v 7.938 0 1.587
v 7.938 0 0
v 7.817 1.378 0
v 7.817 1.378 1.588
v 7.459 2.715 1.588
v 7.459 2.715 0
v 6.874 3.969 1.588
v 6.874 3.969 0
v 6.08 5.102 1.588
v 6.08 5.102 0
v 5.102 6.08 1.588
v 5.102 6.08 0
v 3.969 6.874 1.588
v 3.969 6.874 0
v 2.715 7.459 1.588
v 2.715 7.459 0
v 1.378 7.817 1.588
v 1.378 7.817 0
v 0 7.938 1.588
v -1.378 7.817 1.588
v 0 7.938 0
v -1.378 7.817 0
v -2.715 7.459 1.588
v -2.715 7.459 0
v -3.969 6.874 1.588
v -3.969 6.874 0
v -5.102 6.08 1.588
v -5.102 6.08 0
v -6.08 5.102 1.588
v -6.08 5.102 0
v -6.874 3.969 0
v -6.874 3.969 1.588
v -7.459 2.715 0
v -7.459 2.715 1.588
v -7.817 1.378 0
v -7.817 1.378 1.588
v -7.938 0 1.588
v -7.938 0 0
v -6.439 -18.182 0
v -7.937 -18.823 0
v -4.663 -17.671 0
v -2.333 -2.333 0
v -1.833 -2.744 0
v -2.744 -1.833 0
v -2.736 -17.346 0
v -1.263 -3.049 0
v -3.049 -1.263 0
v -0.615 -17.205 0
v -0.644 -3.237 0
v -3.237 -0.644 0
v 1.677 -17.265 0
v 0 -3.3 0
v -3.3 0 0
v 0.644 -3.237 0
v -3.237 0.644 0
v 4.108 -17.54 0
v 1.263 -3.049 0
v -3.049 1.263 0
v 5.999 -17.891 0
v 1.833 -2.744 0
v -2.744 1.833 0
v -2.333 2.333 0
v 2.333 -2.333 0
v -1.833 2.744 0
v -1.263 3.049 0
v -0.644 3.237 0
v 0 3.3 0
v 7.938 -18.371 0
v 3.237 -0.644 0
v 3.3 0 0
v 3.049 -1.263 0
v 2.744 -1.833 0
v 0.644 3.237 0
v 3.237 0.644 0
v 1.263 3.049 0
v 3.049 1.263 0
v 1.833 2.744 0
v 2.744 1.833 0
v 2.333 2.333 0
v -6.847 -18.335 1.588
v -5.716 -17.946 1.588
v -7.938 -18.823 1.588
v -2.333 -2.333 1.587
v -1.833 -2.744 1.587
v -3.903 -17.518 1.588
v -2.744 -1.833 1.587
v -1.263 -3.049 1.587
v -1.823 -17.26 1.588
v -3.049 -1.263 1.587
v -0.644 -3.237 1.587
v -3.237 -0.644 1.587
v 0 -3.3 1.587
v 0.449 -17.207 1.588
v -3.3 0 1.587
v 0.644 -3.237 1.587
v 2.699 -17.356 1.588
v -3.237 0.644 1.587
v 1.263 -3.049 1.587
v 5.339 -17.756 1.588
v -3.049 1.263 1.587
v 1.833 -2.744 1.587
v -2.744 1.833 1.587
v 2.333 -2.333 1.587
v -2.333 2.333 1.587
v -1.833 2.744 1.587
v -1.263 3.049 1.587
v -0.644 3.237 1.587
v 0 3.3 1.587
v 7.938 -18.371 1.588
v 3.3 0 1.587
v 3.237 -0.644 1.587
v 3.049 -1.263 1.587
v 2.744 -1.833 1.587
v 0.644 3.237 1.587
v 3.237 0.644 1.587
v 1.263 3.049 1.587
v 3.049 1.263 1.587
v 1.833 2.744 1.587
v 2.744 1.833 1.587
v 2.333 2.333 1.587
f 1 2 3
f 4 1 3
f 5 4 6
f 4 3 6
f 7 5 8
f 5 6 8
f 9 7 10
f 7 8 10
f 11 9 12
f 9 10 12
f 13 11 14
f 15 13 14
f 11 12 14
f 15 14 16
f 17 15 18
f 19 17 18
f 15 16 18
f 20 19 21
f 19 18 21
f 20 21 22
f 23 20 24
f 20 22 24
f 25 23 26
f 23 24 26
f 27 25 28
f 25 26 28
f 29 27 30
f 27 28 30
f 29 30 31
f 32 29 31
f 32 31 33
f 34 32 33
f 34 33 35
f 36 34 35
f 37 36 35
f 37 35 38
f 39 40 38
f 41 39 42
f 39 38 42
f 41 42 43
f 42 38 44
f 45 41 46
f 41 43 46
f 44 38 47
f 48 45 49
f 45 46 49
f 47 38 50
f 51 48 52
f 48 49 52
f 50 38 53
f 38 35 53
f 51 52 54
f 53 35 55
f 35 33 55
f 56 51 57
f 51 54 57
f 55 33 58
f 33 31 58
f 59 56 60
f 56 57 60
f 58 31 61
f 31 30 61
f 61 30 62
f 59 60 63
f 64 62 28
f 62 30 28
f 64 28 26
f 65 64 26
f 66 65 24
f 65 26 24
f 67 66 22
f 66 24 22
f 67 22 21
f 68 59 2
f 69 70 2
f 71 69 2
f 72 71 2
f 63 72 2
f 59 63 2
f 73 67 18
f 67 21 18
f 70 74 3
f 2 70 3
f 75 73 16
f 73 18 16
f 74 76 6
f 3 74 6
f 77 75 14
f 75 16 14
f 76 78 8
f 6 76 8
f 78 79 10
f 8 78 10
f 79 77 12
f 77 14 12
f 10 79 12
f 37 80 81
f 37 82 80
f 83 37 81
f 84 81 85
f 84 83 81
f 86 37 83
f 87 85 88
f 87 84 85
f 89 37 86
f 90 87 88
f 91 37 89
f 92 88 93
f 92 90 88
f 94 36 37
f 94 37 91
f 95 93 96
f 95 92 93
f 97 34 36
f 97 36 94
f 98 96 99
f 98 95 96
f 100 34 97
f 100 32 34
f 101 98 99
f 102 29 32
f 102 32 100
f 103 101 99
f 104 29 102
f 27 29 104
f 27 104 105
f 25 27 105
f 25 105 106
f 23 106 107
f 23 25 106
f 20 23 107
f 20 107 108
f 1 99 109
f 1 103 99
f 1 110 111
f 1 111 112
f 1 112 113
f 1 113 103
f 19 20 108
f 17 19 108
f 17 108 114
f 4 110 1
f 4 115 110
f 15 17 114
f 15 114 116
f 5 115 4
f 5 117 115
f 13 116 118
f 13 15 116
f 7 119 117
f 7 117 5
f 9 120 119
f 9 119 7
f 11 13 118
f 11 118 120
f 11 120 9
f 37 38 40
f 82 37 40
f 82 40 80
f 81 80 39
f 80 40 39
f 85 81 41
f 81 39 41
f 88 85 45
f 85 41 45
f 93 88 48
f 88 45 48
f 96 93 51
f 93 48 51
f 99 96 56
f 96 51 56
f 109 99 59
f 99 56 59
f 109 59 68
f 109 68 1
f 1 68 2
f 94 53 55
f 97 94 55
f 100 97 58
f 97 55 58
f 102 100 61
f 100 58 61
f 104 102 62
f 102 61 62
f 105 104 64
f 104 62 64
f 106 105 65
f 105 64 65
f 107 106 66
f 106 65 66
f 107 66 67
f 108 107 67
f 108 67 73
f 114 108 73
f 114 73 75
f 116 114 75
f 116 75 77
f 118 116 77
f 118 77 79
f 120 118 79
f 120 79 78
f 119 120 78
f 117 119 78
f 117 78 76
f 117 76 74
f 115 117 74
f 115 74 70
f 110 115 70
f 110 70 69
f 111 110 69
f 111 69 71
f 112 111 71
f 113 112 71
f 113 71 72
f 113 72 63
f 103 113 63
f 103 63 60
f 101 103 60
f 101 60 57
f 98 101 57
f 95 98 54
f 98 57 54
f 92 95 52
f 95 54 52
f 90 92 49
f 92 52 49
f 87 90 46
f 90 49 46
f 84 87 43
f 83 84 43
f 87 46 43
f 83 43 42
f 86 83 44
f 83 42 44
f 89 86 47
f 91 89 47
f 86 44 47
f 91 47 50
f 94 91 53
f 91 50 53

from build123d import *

# Parameters (mm, degrees)
SKETCH1_R            = 7.9375
SKETCH1_R_2          = 3
BOSS_EXTRUDE1_DEPTH  = 1.5875
M6_CLEARANCE_HOLE1_D = 6.6
SKETCH5_W            = 15.875
SKETCH5_H            = 6.35
CUT_EXTRUDE2_DEPTH   = 27.658658303
CUT_EXTRUDE3_DEPTH   = 21.698467637


with BuildPart() as part:
    # Sketch1 → Boss-Extrude1 (new body)
    # profile 1 of 3: a face of its own
    with BuildSketch(Plane.XY):
        Circle(SKETCH1_R)
        Circle(SKETCH1_R_2, mode=Mode.SUBTRACT)
    # profile 2 of 3: a face of its own
    with BuildSketch(Plane.XY):
        with BuildLine():
            ThreePointArc((7.9375, 0), (0, -7.9375), (-7.9375, 0))
            Line((-7.9375, 0), (-7.9375, -25.4))
            Line((-7.9375, -25.4), (7.9375, -25.4))
            Line((7.9375, -25.4), (7.9375, 0))
        make_face()
    # profile 3 of 3: a face of its own
    with BuildSketch(Plane.XY):
        Circle(SKETCH1_R_2)
    extrude(amount=BOSS_EXTRUDE1_DEPTH)

    # M6 Clearance Hole1 (through all)
    with Locations(Plane.XY.offset(1.5875)):
        with Locations((0, 0)):
            Hole(M6_CLEARANCE_HOLE1_D / 2)

    # Sketch5 → Cut-Extrude2 (cut, through all)
    with BuildSketch(Plane.XY.offset(1.5875)):
        with Locations((0, -22.225)):
            Rectangle(SKETCH5_W, SKETCH5_H)
    extrude(amount=-CUT_EXTRUDE2_DEPTH, mode=Mode.SUBTRACT)

    # Sketch6 → Cut-Extrude3 (cut, through all)
    with BuildSketch(Plane(origin=(0, 0, 0), x_dir=(-1, 0, 0), z_dir=(0, 0, -1))):
        with BuildLine():
            add(Edge.make_bspline(
                [(12.030285896, -22.899436183), (1.652467131, 0.283766307), (-38.284264846, -17.593667439), (-27.906446081, -40.776869929), (-17.528627316, -63.960072418), (22.408104661, -46.082638673), (12.030285896, -22.899436183)],
                knots=[0, 0, 0, 0, 0.5, 0.5, 0.5, 1, 1, 1, 1], degree=3, weights=[1, 0.333333333, 0.333333333, 1, 0.333333333, 0.333333333, 1]))
        make_face()
    extrude(amount=-CUT_EXTRUDE3_DEPTH, mode=Mode.SUBTRACT)


solid = part.part
